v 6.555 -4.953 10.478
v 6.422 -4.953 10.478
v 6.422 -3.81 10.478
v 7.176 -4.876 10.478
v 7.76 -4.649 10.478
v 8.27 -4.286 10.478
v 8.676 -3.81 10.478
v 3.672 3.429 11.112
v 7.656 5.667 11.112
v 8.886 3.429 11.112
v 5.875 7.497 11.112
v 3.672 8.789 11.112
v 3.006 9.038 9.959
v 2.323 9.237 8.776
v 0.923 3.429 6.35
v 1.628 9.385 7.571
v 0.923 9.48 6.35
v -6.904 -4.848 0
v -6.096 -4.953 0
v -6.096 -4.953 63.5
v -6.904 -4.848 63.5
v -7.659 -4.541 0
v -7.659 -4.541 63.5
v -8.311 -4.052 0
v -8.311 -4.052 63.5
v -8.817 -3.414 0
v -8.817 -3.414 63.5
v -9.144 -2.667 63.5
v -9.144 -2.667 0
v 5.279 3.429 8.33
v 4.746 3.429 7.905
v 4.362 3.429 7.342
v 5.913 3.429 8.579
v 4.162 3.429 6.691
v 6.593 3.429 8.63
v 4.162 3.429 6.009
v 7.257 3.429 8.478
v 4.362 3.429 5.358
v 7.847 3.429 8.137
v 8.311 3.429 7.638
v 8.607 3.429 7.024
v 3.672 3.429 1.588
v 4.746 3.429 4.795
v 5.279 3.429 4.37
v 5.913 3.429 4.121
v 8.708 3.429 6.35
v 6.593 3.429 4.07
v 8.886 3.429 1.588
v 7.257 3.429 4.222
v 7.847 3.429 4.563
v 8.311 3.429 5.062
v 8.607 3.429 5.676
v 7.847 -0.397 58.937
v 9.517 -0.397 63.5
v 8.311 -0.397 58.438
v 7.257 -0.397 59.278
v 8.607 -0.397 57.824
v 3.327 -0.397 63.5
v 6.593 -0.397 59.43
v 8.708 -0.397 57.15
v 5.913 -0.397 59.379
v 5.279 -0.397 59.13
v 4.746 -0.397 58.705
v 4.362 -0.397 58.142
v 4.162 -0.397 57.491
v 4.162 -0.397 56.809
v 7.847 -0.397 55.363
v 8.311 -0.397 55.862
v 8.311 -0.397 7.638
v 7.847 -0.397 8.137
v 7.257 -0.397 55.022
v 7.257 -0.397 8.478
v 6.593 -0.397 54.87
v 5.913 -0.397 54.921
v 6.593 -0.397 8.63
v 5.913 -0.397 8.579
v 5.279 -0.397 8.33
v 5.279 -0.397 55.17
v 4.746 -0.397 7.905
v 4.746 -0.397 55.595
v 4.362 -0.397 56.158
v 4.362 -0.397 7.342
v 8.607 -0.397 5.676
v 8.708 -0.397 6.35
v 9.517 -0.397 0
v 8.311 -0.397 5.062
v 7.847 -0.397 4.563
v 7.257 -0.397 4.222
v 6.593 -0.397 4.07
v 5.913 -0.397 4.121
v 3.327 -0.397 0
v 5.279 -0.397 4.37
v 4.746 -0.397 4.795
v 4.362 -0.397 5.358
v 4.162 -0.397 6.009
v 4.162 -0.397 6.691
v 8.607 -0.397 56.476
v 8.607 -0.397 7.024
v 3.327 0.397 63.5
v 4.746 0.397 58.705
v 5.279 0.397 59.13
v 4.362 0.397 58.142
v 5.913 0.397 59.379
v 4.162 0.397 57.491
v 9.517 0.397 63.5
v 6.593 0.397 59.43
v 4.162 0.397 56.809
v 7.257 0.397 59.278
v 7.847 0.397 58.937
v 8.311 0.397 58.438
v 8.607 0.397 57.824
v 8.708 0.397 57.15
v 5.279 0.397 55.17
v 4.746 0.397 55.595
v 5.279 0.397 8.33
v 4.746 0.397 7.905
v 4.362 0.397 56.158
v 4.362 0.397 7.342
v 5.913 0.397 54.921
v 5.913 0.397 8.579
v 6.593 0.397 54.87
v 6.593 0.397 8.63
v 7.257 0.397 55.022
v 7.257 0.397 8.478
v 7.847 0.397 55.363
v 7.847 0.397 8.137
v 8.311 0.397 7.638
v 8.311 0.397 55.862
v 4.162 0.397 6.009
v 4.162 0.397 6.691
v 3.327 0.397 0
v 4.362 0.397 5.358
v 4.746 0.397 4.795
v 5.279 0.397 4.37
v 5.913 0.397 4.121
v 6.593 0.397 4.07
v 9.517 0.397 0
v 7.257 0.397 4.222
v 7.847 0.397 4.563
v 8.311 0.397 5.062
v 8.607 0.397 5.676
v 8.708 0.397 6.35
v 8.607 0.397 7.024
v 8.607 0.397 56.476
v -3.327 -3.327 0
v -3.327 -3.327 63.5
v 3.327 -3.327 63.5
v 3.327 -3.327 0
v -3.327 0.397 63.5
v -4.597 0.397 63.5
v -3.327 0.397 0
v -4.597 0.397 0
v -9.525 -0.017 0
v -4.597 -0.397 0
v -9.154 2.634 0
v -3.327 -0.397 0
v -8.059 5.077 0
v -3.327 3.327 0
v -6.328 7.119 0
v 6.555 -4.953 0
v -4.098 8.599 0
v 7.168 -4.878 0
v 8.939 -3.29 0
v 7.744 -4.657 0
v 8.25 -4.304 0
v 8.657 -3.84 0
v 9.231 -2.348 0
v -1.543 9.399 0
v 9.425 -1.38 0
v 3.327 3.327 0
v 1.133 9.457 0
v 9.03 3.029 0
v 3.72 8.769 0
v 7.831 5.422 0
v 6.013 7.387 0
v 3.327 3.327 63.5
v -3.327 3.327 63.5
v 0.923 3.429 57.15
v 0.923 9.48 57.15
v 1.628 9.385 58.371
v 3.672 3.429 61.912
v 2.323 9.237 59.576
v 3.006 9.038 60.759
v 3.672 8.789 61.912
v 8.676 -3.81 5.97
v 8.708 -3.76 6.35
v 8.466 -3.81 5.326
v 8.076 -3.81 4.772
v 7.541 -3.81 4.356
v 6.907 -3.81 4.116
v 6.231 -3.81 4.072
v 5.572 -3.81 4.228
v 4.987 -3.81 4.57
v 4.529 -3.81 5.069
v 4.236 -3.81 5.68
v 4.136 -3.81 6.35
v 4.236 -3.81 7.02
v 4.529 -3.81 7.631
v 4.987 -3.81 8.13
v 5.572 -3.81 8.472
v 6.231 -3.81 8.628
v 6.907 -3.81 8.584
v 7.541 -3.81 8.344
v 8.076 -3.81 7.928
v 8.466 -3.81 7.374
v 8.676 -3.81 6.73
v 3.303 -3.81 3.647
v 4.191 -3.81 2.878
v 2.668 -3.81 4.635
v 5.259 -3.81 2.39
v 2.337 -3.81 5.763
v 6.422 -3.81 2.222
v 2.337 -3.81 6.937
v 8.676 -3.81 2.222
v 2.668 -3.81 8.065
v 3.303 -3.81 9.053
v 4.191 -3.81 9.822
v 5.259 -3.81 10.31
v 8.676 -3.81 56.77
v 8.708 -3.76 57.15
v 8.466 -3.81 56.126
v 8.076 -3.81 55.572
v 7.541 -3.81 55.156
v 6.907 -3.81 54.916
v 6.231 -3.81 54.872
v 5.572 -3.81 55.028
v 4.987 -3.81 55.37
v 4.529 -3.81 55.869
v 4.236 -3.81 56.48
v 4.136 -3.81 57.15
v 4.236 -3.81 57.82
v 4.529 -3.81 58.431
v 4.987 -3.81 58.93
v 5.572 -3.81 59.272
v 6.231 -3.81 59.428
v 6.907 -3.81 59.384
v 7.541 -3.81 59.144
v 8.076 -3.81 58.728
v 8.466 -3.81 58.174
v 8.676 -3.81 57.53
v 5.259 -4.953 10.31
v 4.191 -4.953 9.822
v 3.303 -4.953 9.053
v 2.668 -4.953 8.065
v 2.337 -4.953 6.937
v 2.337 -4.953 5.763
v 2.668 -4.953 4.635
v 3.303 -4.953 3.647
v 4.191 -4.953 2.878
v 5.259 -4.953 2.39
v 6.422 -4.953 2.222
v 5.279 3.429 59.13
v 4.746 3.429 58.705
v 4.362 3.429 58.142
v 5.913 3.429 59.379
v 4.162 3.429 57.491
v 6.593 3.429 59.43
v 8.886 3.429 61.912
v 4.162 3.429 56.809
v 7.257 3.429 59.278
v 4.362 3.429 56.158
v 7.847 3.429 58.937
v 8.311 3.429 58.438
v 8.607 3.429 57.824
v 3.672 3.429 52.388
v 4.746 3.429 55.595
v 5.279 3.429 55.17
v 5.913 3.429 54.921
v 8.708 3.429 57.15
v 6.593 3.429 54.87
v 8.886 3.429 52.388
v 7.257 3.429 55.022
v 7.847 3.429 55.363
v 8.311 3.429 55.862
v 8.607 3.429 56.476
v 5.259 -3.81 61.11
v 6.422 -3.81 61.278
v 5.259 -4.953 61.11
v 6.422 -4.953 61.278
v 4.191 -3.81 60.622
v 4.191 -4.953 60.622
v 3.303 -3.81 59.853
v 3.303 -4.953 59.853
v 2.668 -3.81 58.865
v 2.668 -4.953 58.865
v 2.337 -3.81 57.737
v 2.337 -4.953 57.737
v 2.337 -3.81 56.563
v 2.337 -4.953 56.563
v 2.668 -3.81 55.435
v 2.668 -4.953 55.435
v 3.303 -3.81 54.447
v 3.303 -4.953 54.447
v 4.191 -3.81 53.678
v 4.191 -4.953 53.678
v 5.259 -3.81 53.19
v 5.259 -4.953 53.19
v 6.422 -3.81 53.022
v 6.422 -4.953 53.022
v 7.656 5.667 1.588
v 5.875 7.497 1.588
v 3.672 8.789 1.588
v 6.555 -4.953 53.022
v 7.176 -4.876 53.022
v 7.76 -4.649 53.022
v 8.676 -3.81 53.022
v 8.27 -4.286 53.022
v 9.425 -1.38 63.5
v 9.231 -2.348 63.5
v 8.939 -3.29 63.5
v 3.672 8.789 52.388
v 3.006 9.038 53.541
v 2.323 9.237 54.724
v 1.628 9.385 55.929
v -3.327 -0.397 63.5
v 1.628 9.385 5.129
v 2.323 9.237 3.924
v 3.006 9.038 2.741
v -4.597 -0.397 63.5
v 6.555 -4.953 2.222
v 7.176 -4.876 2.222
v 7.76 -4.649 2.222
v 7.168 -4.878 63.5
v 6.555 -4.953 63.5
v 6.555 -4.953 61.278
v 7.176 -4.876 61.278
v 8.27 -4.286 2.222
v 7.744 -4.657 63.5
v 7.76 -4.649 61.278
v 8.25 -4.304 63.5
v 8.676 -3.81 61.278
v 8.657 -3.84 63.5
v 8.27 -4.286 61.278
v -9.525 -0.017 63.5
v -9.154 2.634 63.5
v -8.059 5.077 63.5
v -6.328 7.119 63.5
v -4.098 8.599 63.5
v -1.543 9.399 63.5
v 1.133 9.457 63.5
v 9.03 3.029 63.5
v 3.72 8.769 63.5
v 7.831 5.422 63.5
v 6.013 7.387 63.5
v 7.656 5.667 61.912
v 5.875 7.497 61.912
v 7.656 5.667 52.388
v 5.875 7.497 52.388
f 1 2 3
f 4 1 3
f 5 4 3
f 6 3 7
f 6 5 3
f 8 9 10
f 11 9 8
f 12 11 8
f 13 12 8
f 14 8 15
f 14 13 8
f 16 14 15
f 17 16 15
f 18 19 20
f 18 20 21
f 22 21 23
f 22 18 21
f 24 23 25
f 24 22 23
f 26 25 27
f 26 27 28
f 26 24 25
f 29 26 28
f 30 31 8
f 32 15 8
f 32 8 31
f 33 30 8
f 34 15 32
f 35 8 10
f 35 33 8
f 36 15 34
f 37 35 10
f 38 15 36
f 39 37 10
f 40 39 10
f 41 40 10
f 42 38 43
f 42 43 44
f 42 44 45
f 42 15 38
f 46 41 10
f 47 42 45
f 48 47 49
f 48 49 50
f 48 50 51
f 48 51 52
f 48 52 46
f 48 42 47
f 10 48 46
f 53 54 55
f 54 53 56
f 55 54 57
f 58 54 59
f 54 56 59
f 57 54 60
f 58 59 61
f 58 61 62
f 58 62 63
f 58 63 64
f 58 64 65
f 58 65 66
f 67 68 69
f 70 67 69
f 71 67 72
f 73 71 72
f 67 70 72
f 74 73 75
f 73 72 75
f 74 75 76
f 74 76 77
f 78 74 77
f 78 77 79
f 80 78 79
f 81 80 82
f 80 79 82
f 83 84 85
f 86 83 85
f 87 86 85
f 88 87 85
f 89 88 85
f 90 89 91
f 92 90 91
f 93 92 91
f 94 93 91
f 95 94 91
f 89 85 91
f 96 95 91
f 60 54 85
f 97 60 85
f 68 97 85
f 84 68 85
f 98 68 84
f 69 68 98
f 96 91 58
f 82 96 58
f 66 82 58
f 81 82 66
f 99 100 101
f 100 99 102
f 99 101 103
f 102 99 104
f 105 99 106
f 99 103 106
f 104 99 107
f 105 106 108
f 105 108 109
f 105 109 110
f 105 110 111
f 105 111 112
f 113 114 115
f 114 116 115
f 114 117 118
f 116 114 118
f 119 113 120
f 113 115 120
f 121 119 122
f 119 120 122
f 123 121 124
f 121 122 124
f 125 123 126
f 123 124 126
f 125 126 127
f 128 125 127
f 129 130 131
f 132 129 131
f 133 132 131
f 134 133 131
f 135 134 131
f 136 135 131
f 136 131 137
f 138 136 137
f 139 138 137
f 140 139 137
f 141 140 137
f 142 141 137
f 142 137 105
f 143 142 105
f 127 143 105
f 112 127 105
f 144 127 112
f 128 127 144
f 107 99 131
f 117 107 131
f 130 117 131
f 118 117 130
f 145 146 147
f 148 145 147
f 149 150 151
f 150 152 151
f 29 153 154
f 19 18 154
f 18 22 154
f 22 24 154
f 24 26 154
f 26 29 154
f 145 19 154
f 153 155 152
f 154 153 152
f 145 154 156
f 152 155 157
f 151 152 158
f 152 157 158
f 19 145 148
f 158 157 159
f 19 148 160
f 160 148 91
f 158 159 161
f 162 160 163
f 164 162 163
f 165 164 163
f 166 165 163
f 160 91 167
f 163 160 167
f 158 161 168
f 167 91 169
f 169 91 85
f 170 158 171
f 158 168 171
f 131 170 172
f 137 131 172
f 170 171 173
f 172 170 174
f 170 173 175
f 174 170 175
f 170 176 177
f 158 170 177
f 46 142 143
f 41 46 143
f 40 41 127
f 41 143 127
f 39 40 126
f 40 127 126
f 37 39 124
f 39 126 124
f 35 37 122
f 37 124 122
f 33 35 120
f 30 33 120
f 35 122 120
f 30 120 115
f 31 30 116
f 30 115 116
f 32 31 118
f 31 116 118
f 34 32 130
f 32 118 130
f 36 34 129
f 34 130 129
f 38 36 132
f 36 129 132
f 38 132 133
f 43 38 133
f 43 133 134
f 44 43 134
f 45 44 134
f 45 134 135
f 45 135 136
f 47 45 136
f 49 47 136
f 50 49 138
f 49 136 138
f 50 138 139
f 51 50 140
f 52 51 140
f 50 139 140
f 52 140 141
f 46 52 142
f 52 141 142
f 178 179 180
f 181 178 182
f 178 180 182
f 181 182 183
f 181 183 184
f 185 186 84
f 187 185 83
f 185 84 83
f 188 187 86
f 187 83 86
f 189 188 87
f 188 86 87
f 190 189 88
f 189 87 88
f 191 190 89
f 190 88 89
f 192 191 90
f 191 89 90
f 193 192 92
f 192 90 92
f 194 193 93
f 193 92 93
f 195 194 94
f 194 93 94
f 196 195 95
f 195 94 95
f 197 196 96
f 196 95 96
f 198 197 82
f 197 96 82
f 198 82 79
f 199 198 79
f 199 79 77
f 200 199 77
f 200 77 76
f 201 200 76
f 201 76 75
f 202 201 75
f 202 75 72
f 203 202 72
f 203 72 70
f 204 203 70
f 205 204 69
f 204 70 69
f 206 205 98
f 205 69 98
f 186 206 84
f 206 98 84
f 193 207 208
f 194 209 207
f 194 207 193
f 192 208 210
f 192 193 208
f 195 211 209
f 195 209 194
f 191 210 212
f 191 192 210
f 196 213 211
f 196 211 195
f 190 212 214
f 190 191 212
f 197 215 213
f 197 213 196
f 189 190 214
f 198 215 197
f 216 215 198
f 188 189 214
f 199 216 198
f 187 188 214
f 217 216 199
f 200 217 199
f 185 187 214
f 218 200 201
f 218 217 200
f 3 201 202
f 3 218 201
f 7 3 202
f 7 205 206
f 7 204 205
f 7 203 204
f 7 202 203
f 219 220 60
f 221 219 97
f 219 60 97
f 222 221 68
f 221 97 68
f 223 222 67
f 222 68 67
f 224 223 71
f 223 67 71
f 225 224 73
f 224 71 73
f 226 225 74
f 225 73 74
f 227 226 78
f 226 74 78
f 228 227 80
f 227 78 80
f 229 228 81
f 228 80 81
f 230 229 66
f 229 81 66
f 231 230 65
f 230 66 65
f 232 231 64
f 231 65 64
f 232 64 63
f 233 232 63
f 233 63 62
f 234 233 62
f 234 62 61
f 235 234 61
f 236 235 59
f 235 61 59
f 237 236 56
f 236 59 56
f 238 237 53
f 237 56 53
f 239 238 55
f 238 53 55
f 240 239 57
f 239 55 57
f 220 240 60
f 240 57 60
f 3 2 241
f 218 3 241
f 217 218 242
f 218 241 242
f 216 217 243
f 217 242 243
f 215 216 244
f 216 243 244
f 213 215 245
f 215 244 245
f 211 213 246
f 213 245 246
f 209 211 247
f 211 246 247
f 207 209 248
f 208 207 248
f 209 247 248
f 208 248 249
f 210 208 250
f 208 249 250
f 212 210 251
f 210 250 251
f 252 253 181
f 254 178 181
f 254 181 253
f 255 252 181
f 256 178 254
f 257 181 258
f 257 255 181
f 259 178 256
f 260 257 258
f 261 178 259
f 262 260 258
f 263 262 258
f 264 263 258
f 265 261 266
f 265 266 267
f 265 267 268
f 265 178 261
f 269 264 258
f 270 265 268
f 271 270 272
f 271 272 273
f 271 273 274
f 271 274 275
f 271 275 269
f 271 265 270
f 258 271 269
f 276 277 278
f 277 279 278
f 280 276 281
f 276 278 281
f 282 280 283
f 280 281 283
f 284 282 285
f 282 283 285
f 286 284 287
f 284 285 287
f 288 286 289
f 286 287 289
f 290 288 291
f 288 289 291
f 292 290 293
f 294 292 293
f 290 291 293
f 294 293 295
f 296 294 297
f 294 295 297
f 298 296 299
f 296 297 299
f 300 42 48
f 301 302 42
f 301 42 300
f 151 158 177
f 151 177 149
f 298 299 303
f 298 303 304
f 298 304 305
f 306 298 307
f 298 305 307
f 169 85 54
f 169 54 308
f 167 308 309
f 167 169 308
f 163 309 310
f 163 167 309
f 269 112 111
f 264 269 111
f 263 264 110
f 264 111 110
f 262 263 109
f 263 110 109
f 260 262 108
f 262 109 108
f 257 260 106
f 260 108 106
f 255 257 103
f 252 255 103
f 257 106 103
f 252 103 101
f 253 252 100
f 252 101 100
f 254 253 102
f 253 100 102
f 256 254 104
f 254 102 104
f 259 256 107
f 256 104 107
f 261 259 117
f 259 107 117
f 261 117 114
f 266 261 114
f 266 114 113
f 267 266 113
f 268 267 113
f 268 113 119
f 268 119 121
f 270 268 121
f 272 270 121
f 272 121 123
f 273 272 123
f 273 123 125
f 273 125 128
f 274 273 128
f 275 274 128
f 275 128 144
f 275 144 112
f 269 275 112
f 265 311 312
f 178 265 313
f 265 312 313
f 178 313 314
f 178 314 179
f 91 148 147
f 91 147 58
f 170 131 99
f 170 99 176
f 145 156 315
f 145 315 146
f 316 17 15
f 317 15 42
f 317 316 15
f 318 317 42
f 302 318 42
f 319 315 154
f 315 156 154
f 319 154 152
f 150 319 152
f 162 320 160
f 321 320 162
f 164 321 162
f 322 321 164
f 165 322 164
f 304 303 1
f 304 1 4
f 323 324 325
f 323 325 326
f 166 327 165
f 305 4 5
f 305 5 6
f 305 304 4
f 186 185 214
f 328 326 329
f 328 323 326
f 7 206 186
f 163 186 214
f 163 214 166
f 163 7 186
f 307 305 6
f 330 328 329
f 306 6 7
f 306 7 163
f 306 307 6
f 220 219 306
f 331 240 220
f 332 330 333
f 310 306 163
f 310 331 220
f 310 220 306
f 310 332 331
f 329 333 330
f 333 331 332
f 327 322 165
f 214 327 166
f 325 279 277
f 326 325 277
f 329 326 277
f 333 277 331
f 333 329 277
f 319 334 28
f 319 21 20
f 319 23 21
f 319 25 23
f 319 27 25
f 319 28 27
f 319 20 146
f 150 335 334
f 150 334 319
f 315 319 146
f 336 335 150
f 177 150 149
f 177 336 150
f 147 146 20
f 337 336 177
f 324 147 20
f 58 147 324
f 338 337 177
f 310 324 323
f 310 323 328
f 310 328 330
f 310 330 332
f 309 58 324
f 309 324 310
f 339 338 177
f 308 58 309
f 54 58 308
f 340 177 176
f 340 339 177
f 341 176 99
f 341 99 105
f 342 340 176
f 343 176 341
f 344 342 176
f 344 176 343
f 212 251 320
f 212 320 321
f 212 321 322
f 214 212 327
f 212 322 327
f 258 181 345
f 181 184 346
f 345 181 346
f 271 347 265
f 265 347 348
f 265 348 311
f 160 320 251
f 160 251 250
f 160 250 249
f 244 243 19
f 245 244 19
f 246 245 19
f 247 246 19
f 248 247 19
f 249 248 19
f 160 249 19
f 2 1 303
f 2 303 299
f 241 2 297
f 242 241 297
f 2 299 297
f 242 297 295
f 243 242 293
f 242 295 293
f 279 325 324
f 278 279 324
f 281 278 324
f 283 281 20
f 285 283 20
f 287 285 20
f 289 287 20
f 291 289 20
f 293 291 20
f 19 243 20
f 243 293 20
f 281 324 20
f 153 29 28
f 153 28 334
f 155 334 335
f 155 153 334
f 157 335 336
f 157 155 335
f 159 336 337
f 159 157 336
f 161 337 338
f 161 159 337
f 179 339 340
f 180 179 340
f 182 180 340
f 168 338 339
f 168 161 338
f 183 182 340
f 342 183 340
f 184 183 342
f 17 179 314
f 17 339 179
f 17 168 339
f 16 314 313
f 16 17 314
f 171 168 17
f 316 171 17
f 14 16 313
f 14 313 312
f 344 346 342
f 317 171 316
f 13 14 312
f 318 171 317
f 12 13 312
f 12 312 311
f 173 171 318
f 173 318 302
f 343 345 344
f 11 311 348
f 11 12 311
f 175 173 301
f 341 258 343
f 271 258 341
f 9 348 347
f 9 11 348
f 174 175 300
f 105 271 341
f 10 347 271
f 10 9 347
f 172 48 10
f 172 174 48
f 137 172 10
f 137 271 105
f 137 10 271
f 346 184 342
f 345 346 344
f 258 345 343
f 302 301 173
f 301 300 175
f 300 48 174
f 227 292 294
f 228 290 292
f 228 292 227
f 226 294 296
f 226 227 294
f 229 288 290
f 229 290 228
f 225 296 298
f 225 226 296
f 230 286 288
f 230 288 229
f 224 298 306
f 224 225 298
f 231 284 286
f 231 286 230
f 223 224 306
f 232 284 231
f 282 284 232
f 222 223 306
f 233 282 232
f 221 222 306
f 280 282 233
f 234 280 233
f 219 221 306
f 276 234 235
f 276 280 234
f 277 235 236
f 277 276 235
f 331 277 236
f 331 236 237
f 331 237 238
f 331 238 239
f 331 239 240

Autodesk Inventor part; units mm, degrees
ref_plane "YZ Plane" through (0, 0, 0) normal (1, 0, 0) x (0, 1, 0)
sketch "Sketch1" plane through (0, 0, 0) normal (0, 0, 1) x (1, 0, 0)
  line L0 (-3.3274, -3.3274) -> (3.3274, -3.3274)
  line L1 (3.3274, -3.3274) -> (3.3274, 3.3274)
  line L2 (3.3274, 3.3274) -> (-3.3274, 3.3274)
  line L3 (-3.3274, 3.3274) -> (-3.3274, -3.3274)
  line L4 (-3.3274, -3.3274) -> (3.3274, 3.3274) construction
  line L5 (3.3274, -3.3274) -> (-3.3274, 3.3274) construction
  circle A0 centre (0, 0) radius 9.525
  line L6 (-4.5974, 0.3969) -> (11.7358, 0.3969)
  line L7 (11.7358, 0.3969) -> (11.7358, -0.3969)
  line L8 (11.7358, -0.3969) -> (-4.5974, -0.3969)
  line L9 (-4.5974, -0.3969) -> (-4.5974, 0.3969)
  point P0 (-4.5974, 0)
  point P1 (-3.3274, -0.3969)
  point P2 (-3.3274, 0.3969)
  point P3 (3.3274, 0.3969)
  point P4 (9.5167, 0.3969)
  point P5 (9.5167, -0.3969)
  point P6 (3.3274, -0.3969)
  dimension "d0" = 6.6548
  dimension "d1" = 6.6548
  dimension "d2" = 19.05
  dimension "d3" = 0.7937
  dimension "d4" = 1.27
extrude "Extrusion1" add sketch "Sketch1" along normal blind 63.5 contours L0 L1 L8 A0 L6 L2 L3 L9
sketch "Sketch2" plane through (3.3274, 0.3969, 0) normal (0, -1, 0) x (1, 0, 0)
  circle A0 centre (3.0947, 57.15) radius 2.286
  line L0 (0, 63.5) -> (6.1893, 63.5) projected
  line L1 (6.1893, 0) -> (6.1893, 63.5) projected
  line L2 (6.1893, 31.75) -> (0, 31.75)
  line L3 (0, 0) -> (0, 63.5) projected
  circle A1 centre (3.0947, 6.35) radius 2.286
  point P0 (-3.3274, 0)
  point P1 (3.0947, 63.5)
  dimension "d7" = 4.572
  dimension "d8" = 6.35
extrude "Extrusion2" cut sketch "Sketch2" along normal mid plane 63.5 contours A0 | A1
ref_plane "Work Plane1" through (0, -9.525, 0) normal (0, -1, 0) x (1, 0, 0)
ref_plane "Work Plane2" through (0, 9.525, 0) normal (0, 1, 0) x (1, 0, 0)
sketch "Sketch3" plane through (0, -9.525, 0) normal (0, -1, 0) x (1, 0, 0)
  circle A0 centre (6.4221, 6.35) radius 2.286 projected
  circle A1 centre (6.4221, 6.35) radius 4.1275
  line L0 (6.4221, 10.4775) -> (9.5167, 10.4775)
  line L1 (9.5167, 0) -> (9.5167, 63.5) projected
  line L2 (6.4221, 2.2225) -> (9.5167, 2.2225)
  line L3 (-9.525, 0) -> (-9.525, 63.5) projected
  line L4 (-9.525, 31.75) -> (9.5167, 31.75)
  circle A2 centre (6.4221, 57.15) radius 4.1275
  line L5 (6.4221, 53.0225) -> (9.5167, 53.0225)
  line L6 (6.4221, 61.2775) -> (9.5167, 61.2775)
  point P0 (0, 0)
  dimension "d11" = 8.255
extrude "Extrusion3" cut sketch "Sketch3" against normal blind 5.715 contours A1 L1 | L0 L1 A1 | A1 L1 L2 | L5 A2 L1 | A2 L1 | A2 L6 L1 picked at (9.2472, 6.35) picked at (7.5728, 58.1798)
sketch "Sketch4" plane through (0, 9.525, 0) normal (0, 1, 0) x (1, 0, 0)
  circle A0 centre (6.4221, -6.35) radius 2.286 projected
  arc A1 (6.4221, -2.2225) -> (6.4221, -10.4775) centre (6.4221, -6.35) ccw projected
  line L0 (0.9228, -6.35) -> (3.6724, -1.5875)
  line L1 (3.6724, -1.5875) -> (9.1717, -1.5875)
  line L2 (9.1717, -1.5875) -> (11.9213, -6.35)
  line L3 (11.9213, -6.35) -> (9.1717, -11.1125)
  line L4 (9.1717, -11.1125) -> (3.6724, -11.1125)
  line L5 (3.6724, -11.1125) -> (0.9228, -6.35)
  line L6 (-9.525, 0) -> (-9.525, -63.5) projected
  line L7 (-9.525, -31.75) -> (9.525, -31.75)
  line L8 (9.1717, -11.1125) -> (11.7374, -11.1125)
  line L9 (11.7374, -11.1125) -> (11.7374, -1.5875)
  line L10 (11.7374, -1.5875) -> (9.1717, -1.5875)
  line L11 (0.9228, -57.15) -> (3.6724, -61.9125)
  line L12 (3.6724, -61.9125) -> (9.1717, -61.9125)
  line L13 (9.1717, -61.9125) -> (11.9213, -57.15)
  line L14 (11.9213, -57.15) -> (9.1717, -52.3875)
  line L15 (9.1717, -52.3875) -> (3.6724, -52.3875)
  line L16 (3.6724, -52.3875) -> (0.9228, -57.15)
  line L17 (9.1717, -52.3875) -> (11.7374, -52.3875)
  line L18 (11.7374, -52.3875) -> (11.7374, -61.9125)
  line L19 (11.7374, -61.9125) -> (9.1717, -61.9125)
  point P0 (0, 0)
  point P1 (11.7374, -6.6685)
  point P2 (11.7374, -6.0315)
  dimension "d16" = 9.525
extrude "Extrusion4" cut sketch "Sketch4" against normal blind 6.096 contours A0 | L0 L1 L2 L9 L3 L4 L5 | L10 L9 L2 | L3 L9 L8 | L16 L15 L14 L18 L13 L12 L11 | L13 L18 L19 | L17 L18 L14
sketch "Sketch5" plane through (0, 0, 63.5) normal (0, 0, 1) x (1, 0, 0)
  line L0 (4.1361, -3.81) -> (8.7081, -3.81) projected
  arc A0 (9.5167, 0.3969) -> (9.5167, -0.3969) centre (0, 0) ccw projected
  line L1 (8.1359, -4.953) -> (-8.1359, -4.953)
  arc A1 (-8.1359, -4.953) -> (8.1359, -4.953) centre (0, 0) ccw
  dimension "d17" = 1.143
extrude "Extrusion5" cut sketch "Sketch5" against normal up to surface (63.5 mm away)
fillet "Fillet1" radius 3.175 1 edges at (-8.1359, -4.953, 31.75)
fillet "Fillet2" radius 2.54 3 edges at (8.1359, -4.953, 31.75) (8.1359, -4.953, 62.3888) (8.1359, -4.953, 1.1112)
properties part number "AxleBar"
